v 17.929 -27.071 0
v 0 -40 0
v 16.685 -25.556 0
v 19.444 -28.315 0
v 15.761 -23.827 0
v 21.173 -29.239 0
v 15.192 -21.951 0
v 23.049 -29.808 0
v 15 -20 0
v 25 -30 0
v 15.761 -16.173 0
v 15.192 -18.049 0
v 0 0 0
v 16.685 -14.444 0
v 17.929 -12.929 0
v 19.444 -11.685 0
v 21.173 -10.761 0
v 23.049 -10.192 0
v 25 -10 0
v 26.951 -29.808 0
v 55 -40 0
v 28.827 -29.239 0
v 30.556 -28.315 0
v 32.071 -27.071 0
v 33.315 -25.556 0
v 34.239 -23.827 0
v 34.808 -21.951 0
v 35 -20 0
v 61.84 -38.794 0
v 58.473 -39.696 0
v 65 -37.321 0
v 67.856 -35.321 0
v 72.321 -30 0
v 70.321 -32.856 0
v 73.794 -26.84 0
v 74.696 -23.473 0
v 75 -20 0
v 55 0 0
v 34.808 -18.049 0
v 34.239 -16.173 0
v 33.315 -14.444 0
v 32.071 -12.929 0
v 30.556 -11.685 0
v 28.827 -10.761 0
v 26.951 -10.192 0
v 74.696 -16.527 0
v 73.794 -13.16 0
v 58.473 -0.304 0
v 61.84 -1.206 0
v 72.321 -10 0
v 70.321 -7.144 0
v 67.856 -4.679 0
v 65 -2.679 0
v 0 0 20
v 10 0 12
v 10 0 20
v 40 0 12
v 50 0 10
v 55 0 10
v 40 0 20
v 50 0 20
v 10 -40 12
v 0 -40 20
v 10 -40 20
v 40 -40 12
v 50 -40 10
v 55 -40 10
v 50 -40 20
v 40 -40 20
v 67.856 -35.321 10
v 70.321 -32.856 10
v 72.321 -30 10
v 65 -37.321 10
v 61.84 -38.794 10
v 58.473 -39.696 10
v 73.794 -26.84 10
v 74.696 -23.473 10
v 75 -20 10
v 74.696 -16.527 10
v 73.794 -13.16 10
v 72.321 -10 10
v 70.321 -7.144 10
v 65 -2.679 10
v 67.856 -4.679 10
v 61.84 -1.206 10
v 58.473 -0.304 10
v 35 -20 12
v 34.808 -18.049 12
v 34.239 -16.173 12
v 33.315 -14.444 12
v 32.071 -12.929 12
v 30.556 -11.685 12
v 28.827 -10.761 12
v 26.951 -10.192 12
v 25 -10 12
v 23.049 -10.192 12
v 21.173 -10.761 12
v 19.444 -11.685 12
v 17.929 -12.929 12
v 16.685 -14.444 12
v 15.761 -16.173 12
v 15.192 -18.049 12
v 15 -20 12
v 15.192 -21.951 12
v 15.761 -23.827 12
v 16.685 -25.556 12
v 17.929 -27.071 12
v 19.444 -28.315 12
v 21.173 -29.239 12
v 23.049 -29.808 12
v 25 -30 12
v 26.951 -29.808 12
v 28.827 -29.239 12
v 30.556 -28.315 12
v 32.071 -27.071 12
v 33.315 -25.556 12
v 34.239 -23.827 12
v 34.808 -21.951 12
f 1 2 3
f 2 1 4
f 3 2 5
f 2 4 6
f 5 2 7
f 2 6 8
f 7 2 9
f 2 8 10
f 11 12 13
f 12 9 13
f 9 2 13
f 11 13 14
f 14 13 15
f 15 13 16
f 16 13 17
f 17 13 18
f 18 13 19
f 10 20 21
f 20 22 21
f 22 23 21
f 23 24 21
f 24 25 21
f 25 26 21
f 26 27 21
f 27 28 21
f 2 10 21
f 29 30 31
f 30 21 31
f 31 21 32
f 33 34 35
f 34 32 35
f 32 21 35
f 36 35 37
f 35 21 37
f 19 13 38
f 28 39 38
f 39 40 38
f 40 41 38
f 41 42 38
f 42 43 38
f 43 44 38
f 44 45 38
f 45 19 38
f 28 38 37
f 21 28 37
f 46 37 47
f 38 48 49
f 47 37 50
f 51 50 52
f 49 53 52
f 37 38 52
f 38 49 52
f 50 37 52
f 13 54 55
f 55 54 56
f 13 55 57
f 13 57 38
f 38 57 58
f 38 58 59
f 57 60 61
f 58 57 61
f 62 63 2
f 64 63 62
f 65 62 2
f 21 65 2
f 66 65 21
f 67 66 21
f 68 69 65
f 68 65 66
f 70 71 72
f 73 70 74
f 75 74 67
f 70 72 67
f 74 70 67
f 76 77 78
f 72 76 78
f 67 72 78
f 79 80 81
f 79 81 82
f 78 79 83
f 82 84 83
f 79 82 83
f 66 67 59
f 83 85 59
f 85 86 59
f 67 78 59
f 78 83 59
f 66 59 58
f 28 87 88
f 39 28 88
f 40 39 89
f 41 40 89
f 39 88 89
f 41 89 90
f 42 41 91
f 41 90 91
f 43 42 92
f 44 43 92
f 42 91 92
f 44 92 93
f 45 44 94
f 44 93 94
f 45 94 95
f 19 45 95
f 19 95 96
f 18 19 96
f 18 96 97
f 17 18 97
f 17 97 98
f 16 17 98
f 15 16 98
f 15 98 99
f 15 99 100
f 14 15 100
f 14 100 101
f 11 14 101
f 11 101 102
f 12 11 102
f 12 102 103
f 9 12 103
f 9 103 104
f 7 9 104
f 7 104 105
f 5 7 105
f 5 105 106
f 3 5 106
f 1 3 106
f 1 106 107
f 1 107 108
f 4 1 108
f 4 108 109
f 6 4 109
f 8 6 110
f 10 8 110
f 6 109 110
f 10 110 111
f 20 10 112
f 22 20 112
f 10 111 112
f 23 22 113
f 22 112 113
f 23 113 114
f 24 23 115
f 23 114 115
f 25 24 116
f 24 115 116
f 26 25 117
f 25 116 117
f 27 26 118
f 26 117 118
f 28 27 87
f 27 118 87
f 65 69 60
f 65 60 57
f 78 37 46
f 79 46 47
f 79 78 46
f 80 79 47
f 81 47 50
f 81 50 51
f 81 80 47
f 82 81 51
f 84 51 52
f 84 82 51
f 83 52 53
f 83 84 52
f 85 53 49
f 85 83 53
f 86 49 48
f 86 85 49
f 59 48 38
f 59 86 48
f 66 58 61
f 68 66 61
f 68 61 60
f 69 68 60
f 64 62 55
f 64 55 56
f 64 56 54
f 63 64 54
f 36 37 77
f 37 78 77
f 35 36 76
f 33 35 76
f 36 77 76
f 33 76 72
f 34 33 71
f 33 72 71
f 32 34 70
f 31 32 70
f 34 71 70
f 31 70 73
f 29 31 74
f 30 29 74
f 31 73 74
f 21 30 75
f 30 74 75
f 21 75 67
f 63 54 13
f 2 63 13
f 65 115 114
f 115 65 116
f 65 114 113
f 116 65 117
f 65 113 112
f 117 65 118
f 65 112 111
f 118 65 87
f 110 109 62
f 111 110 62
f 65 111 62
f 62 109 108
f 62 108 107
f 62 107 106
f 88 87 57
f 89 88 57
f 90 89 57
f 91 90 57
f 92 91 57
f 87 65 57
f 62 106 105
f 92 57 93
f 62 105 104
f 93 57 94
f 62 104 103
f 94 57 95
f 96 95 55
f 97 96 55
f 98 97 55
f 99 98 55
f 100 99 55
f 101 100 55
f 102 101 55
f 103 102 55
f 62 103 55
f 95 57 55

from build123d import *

# Parameters (mm, degrees)
F1_DEPTH = 40
F2_R     = 19.99999
F3_R     = 10
F4_DEPTH = 12.001


# Not quite as in the source:
# - a fillet or chamfer is up to 0.001 mm smaller than in the source, because OpenCascade refuses the exact size


with BuildPart() as f1:
    # F0 (on Front) → F1 (new body)
    with BuildSketch(Plane.XZ):
        Polygon((0, 20), (0, 0), (75, 0), (75, 10), (50, 10), (50, 20), (40, 20), (40, 12), (10, 12), (10, 20), align=None)
    extrude(amount=F1_DEPTH)

    # F2 (radius 20 in the source; OpenCascade refuses exactly that, so slightly less here)
    f2_edges = [f1.edges().sort_by_distance(p)[0] for p in [
        (75, -40, 5),
        (75, 0, 5),
    ]]
    fillet(f2_edges, radius=F2_R)

    # F3 (on face) → F4 (cut, through all)
    with BuildSketch(Plane.XY.offset(12)):
        with Locations((25, -20)):
            Circle(F3_R)
    extrude(amount=-F4_DEPTH, mode=Mode.SUBTRACT)


solid = f1.part
